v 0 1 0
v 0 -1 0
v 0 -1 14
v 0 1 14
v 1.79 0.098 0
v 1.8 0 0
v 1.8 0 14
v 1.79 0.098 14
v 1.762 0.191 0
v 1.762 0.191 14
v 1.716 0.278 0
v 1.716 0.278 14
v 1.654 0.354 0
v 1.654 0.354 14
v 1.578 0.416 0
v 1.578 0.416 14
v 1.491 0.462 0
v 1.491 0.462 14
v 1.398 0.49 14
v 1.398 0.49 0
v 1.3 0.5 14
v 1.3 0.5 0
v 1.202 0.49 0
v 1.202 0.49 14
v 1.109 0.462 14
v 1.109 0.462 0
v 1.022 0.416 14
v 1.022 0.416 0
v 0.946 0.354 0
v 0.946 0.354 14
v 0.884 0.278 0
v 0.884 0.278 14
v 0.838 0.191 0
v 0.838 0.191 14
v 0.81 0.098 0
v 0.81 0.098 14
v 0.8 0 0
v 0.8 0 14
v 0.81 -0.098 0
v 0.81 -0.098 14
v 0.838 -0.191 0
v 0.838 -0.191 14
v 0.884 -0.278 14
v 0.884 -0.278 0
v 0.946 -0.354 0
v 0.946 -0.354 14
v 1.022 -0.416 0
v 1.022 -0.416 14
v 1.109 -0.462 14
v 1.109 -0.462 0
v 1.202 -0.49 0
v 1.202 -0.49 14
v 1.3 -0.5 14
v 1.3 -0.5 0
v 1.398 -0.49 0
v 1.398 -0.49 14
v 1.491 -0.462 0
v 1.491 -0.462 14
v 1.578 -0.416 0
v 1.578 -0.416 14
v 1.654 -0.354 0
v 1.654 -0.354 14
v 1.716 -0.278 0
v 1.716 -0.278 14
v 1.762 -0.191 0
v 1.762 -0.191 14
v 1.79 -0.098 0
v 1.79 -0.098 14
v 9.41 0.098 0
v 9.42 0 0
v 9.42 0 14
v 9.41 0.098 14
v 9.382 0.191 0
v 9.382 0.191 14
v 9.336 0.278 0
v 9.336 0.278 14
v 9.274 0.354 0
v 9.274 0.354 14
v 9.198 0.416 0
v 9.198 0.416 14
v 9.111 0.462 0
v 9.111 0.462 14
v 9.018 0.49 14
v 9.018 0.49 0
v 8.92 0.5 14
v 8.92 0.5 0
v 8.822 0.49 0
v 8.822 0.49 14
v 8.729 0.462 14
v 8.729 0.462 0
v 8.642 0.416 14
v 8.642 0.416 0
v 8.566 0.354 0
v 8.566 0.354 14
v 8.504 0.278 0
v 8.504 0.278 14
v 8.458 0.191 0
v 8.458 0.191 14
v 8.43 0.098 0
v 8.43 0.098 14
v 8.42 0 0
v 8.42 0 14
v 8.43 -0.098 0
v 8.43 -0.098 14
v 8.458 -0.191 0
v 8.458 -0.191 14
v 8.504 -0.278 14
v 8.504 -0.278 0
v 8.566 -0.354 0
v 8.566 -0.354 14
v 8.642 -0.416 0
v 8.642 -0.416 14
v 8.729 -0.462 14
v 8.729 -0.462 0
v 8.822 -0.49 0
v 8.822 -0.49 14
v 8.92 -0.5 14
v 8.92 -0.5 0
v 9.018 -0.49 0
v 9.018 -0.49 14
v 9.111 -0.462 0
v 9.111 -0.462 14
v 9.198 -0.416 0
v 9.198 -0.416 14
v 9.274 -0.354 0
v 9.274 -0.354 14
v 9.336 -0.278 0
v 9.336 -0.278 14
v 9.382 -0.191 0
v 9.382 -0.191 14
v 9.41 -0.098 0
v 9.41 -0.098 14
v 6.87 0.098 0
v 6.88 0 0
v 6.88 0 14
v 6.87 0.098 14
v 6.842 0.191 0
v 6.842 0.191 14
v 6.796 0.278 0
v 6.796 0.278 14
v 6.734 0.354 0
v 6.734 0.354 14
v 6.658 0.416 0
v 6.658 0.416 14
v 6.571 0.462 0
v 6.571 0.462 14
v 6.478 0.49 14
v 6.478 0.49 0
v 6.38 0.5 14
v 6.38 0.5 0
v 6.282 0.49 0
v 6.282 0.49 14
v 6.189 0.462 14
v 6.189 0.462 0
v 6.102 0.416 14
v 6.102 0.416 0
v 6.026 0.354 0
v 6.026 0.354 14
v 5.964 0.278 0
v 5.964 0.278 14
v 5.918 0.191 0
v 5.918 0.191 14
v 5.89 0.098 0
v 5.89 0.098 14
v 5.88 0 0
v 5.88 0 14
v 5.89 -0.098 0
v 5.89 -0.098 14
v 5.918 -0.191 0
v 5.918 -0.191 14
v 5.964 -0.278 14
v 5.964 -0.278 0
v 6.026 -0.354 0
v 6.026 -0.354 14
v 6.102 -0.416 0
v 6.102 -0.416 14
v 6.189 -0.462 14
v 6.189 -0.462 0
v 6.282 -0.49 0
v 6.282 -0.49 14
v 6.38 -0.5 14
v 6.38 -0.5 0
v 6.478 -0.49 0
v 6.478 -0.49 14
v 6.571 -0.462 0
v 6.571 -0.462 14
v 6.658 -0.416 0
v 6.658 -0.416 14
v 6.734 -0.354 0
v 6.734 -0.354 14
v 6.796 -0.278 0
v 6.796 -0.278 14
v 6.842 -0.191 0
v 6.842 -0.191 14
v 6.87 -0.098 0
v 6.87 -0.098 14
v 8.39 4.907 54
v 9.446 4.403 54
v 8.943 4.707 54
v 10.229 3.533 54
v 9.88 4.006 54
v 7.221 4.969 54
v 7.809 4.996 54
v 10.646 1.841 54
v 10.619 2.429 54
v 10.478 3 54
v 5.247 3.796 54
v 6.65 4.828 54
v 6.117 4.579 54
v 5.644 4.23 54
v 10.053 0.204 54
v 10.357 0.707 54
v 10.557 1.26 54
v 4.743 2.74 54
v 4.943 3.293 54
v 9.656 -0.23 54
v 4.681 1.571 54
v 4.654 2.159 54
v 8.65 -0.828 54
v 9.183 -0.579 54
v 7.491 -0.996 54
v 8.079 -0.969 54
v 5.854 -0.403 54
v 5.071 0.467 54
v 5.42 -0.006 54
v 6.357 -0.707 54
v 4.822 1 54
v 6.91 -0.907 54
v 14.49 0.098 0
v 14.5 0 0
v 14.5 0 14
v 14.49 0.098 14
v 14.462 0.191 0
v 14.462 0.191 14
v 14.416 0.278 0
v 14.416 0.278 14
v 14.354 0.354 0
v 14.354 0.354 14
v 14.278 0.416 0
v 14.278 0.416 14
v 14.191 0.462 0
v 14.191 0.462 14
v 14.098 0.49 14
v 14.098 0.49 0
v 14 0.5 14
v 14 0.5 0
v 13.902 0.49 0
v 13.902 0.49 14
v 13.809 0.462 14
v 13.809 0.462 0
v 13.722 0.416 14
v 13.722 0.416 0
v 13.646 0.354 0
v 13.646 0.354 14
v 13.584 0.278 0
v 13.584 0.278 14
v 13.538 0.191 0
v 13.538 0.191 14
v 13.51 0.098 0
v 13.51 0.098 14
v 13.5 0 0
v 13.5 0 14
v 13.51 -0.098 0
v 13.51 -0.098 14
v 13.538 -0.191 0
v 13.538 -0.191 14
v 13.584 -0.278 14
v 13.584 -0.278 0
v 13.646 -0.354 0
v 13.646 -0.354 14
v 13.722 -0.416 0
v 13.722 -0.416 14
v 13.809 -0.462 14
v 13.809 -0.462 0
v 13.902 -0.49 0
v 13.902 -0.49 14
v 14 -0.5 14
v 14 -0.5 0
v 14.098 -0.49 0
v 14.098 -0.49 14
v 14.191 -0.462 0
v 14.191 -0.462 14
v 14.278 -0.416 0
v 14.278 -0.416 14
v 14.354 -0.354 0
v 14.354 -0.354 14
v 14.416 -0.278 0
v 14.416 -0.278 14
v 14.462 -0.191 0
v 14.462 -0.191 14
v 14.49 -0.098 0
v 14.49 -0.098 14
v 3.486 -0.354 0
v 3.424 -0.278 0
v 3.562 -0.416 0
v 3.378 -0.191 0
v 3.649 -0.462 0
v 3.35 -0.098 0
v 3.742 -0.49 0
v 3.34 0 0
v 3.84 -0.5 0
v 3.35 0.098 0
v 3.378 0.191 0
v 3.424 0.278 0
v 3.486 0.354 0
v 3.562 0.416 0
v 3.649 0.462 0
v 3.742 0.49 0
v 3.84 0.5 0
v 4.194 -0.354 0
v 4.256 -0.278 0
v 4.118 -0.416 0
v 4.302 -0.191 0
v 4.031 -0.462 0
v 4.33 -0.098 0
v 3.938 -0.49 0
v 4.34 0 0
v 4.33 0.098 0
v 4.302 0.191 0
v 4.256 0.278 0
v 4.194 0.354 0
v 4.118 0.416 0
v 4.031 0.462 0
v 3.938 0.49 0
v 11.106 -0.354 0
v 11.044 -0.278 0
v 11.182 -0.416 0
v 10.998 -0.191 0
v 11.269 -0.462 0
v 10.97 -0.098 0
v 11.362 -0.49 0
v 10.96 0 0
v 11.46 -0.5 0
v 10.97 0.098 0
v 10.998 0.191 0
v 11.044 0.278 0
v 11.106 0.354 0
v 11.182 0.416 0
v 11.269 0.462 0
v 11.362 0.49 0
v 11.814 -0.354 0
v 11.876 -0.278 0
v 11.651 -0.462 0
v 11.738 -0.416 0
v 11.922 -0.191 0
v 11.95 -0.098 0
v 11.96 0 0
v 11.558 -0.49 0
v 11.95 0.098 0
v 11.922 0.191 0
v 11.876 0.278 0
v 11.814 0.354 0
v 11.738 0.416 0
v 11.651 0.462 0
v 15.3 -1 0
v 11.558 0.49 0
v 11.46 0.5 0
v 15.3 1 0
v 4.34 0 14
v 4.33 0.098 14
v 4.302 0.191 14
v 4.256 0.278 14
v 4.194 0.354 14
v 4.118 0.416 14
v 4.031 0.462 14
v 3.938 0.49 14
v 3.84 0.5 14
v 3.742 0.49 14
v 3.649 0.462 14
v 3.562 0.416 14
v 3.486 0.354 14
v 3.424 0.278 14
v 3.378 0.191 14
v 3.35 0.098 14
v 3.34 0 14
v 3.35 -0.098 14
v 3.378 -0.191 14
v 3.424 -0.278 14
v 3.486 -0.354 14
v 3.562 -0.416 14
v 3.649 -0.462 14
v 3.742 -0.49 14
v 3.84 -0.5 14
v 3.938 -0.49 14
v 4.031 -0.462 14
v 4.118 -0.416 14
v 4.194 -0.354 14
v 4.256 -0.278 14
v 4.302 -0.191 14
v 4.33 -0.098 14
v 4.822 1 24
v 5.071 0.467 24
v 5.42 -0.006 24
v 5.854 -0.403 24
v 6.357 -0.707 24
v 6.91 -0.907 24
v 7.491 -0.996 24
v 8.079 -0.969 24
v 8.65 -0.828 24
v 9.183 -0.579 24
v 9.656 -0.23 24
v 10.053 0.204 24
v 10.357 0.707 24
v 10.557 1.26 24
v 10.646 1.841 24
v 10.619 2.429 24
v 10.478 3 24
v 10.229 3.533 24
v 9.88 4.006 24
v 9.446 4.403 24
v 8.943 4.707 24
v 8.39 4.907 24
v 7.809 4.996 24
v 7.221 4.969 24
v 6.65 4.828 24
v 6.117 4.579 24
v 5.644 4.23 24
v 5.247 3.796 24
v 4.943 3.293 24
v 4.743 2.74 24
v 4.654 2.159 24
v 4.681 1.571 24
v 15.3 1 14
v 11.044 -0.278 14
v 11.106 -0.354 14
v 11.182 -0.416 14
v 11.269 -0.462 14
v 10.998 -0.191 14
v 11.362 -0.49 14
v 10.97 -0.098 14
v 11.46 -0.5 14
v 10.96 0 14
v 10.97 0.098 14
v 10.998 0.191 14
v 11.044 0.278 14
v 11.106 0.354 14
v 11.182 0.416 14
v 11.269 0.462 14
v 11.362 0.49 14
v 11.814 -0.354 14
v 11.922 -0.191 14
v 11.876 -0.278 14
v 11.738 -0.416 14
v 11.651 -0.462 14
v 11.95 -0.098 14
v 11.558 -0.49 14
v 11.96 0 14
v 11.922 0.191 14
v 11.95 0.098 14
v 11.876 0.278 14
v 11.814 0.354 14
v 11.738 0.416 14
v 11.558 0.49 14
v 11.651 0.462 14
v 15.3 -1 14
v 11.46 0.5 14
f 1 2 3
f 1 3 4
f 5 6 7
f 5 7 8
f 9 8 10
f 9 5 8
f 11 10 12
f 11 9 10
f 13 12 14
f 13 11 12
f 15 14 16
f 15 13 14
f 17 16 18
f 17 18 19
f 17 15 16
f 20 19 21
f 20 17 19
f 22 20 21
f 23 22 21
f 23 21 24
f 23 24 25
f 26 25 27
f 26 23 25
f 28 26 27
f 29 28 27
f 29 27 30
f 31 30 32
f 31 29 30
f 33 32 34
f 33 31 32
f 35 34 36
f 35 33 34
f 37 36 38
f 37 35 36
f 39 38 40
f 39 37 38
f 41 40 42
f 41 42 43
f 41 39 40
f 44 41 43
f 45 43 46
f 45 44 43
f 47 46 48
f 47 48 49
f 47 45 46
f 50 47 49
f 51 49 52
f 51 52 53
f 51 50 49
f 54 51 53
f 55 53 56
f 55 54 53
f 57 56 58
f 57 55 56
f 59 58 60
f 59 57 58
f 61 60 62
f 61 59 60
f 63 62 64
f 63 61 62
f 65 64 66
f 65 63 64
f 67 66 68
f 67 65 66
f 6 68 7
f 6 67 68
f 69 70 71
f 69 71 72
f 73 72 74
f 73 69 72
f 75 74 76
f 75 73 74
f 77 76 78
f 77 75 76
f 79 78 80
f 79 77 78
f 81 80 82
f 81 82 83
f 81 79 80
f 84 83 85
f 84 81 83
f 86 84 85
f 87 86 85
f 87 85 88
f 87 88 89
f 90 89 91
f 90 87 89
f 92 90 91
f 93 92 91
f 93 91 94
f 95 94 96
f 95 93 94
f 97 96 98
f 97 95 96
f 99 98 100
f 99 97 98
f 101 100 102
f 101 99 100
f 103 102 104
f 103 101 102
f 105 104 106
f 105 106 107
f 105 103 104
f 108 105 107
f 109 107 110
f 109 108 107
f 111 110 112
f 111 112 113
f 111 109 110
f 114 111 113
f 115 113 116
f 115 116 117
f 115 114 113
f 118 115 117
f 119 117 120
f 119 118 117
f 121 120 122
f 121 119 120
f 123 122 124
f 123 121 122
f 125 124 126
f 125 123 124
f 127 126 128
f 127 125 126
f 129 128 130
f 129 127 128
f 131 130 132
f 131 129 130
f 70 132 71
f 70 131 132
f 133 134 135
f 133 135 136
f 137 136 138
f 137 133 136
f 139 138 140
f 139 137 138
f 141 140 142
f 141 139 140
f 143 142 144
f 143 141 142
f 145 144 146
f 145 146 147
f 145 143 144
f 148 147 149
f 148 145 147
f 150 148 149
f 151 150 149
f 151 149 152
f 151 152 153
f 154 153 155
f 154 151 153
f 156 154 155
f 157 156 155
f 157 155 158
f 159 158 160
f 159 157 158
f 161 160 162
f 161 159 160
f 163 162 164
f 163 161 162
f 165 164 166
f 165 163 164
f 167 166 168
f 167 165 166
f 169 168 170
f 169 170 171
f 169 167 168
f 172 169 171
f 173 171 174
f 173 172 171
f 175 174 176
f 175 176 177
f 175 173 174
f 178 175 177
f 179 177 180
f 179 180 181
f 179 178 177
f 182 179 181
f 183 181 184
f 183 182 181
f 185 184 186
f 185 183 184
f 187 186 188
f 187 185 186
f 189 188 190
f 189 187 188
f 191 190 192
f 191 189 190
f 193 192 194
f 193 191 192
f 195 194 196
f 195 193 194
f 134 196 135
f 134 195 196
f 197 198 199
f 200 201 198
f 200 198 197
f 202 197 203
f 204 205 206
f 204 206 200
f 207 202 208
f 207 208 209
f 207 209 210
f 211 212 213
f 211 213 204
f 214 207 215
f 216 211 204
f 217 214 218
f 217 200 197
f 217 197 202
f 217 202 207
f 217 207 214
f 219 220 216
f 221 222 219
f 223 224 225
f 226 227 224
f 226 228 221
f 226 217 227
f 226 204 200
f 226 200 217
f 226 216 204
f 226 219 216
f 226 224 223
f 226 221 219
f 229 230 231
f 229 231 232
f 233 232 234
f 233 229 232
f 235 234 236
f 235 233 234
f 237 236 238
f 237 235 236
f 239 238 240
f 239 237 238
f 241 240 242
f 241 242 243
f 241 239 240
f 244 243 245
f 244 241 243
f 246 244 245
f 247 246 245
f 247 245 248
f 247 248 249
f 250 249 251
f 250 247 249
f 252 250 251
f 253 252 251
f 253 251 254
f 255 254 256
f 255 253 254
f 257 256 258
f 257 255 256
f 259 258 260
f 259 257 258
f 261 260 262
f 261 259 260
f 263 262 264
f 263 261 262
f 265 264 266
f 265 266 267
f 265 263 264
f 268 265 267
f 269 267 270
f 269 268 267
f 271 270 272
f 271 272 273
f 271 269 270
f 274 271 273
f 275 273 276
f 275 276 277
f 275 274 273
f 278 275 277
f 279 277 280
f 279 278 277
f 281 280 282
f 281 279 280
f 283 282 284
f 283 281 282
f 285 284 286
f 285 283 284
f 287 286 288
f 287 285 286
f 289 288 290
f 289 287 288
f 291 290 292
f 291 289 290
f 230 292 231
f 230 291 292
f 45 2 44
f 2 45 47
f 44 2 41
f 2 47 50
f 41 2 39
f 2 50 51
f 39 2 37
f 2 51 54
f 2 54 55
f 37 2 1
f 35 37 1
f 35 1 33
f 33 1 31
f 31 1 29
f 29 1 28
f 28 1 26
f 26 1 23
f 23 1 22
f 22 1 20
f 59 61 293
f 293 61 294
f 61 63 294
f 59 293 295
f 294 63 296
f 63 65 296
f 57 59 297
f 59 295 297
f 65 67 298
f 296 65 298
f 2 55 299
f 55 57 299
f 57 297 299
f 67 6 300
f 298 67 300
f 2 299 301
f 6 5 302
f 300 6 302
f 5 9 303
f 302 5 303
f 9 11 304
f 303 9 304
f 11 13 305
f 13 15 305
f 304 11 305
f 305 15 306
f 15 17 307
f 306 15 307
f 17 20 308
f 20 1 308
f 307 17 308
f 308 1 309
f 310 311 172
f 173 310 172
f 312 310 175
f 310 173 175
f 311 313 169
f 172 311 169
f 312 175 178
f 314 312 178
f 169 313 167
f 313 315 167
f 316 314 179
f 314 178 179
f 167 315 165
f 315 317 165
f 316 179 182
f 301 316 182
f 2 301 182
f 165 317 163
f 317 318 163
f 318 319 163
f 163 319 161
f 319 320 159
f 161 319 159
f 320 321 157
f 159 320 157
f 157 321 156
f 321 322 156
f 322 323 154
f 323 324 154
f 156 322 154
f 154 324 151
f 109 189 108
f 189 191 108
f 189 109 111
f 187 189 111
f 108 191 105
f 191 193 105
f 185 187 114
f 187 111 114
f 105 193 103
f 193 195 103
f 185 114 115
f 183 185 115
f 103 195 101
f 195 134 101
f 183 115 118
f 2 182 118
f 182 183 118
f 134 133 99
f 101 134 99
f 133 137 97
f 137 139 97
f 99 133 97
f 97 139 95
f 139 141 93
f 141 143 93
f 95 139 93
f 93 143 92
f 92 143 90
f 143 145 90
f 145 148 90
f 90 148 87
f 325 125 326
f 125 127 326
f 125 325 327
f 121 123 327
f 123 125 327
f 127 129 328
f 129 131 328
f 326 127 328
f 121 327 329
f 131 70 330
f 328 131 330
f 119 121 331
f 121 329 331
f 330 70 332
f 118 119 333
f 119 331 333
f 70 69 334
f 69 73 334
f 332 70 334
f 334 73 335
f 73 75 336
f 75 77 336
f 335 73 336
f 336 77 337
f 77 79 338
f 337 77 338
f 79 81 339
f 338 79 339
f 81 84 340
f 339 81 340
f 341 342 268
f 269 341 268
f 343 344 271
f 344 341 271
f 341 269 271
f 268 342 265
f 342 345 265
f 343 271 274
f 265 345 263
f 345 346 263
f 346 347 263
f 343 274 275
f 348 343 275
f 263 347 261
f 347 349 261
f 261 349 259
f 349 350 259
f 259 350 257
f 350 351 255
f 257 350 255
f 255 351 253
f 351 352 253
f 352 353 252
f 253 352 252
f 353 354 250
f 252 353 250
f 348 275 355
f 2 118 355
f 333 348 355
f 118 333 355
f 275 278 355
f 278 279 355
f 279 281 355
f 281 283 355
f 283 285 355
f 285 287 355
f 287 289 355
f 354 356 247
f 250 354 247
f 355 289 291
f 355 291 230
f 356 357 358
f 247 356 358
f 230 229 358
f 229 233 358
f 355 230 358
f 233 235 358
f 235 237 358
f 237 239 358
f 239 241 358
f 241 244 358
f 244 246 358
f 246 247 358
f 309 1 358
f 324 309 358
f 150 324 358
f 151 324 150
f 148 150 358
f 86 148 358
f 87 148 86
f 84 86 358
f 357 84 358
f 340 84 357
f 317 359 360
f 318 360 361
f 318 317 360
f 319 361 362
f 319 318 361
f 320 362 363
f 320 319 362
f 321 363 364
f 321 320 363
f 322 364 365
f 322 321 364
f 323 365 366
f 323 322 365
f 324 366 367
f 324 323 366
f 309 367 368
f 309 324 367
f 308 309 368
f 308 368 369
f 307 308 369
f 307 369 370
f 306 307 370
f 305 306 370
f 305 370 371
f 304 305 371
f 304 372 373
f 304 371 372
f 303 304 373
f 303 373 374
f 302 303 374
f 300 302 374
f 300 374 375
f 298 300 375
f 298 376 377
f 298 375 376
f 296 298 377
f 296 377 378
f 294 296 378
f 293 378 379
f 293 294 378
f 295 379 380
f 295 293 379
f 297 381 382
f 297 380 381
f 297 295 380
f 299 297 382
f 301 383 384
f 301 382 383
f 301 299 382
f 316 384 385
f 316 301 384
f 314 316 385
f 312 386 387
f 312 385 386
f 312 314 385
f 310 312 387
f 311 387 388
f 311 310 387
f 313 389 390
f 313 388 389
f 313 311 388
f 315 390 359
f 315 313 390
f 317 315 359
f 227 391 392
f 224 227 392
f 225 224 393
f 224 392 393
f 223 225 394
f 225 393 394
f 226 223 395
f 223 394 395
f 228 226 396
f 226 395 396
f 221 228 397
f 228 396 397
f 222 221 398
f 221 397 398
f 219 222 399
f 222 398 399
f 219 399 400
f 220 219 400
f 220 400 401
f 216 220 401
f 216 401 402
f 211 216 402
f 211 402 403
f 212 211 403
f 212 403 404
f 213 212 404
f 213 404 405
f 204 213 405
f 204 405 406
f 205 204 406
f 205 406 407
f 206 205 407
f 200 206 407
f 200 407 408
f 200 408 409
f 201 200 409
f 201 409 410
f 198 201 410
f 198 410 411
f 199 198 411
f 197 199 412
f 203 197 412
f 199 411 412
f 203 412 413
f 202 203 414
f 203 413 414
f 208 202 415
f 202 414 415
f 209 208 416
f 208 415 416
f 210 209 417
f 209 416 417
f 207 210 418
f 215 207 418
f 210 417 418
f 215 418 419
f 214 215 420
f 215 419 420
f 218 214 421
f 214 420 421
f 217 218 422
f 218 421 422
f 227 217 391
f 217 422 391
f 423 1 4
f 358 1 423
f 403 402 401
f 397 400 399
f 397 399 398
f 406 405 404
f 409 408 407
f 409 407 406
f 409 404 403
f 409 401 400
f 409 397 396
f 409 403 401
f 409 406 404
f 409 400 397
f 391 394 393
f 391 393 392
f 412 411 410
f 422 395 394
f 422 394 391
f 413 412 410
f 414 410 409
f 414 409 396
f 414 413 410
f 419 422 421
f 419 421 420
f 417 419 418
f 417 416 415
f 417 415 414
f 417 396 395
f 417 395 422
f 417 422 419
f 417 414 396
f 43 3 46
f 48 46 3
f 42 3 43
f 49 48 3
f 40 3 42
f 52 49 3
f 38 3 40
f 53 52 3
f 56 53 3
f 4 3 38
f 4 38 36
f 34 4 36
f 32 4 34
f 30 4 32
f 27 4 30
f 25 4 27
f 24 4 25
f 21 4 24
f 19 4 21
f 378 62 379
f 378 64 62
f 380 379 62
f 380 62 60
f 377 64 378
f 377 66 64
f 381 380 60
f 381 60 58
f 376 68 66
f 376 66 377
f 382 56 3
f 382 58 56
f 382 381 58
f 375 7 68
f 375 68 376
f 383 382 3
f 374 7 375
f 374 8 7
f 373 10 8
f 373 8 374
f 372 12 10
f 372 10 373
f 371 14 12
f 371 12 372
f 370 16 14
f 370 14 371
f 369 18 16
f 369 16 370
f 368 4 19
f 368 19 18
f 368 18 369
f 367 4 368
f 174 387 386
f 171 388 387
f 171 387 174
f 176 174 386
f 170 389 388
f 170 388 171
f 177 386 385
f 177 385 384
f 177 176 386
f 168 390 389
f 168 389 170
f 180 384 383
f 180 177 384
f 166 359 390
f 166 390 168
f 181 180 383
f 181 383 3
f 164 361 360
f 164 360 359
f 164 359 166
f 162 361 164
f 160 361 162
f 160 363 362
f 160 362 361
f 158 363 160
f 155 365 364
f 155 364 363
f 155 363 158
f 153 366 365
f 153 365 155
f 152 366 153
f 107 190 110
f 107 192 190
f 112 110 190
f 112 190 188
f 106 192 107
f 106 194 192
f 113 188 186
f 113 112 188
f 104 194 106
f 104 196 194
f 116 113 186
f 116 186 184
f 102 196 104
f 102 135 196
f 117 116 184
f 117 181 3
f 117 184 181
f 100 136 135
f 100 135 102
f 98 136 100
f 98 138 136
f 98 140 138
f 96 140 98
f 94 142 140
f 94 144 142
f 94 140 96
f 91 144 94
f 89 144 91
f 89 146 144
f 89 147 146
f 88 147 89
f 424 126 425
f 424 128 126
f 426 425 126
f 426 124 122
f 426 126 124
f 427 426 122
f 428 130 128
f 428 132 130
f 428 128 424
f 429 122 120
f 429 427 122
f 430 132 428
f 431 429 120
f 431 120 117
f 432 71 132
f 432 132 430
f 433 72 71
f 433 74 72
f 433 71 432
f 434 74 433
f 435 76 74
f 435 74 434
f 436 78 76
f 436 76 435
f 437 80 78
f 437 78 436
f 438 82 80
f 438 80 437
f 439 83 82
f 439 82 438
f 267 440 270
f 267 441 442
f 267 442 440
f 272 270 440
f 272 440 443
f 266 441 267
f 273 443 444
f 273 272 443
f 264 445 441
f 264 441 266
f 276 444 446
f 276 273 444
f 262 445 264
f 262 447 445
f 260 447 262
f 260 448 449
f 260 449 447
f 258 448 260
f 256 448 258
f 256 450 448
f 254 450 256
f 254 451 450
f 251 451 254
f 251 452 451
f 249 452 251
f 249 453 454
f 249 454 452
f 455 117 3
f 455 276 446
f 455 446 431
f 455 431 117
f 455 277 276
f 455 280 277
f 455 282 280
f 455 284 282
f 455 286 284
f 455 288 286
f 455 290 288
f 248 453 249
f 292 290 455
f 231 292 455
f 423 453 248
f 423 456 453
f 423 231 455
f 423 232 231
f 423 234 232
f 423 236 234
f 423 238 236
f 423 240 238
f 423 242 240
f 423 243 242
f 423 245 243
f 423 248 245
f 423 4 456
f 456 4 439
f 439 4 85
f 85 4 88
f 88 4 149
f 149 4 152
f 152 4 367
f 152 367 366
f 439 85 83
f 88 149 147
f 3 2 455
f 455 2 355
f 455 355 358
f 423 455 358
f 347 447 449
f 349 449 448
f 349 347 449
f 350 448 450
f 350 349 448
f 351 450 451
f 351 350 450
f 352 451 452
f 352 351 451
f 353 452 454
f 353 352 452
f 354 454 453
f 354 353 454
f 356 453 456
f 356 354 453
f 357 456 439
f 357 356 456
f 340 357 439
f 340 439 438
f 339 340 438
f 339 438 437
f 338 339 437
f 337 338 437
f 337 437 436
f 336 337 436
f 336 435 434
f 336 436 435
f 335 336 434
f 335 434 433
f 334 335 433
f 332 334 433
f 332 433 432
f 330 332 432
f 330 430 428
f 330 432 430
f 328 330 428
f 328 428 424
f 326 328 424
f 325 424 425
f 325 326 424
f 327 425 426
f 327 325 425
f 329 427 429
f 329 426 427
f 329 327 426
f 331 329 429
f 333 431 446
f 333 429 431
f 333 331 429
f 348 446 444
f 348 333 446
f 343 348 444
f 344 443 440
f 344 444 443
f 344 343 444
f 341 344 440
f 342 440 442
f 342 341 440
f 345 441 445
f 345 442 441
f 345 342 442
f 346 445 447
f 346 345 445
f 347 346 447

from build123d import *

# Parameters (mm, degrees)
ESQUISSE1_W             = 15.3
ESQUISSE1_H             = 2
ESQUISSE1_R             = 0.5
BOSS_EXTRU_1_DEPTH      = 14
ESQUISSE2_R             = 3
BOSS_EXTRU_2_DEPTH      = 40
ESQUISSE3_R             = 4
ENL_V_MAT_EXTRU_1_DEPTH = 10


with BuildPart() as part:
    # Esquisse1 → Boss.-Extru.1 (new body)
    with BuildSketch(Plane.XY):
        with Locations((7.65, 0)):
            Rectangle(ESQUISSE1_W, ESQUISSE1_H)
        with Locations((1.3, 0)):
            Circle(ESQUISSE1_R, mode=Mode.SUBTRACT)
        with Locations((3.84, 0)):
            Circle(ESQUISSE1_R, mode=Mode.SUBTRACT)
        with Locations((6.38, 0)):
            Circle(ESQUISSE1_R, mode=Mode.SUBTRACT)
        with Locations((8.92, 0)):
            Circle(ESQUISSE1_R, mode=Mode.SUBTRACT)
        with Locations((11.46, 0)):
            Circle(ESQUISSE1_R, mode=Mode.SUBTRACT)
        with Locations((14, 0)):
            Circle(ESQUISSE1_R, mode=Mode.SUBTRACT)
    extrude(amount=BOSS_EXTRU_1_DEPTH)

    # Esquisse2 → Boss.-Extru.2 (add)
    with BuildSketch(Plane.XY.offset(14)):
        with Locations(Location((7.65, 2, 0), (0, 0, 199.471220634))):
            Circle(ESQUISSE2_R)
    extrude(amount=BOSS_EXTRU_2_DEPTH)

    # Esquisse3 → Enlèv. mat.-Extru.1 (cut)
    with BuildSketch(Plane(origin=(0, 0, 14), x_dir=(-1, 0, 0), z_dir=(0, 0, -1))):
        with Locations((-7.65, 2)):
            Circle(ESQUISSE3_R)
    extrude(amount=-ENL_V_MAT_EXTRU_1_DEPTH, mode=Mode.SUBTRACT)


with BuildPart() as enl_v_mat_extru_1_piece_1:
    # of the separate pieces the step leaves, piece 1, a body of its own (enl_v_mat_extru_1_pieces)
    add(part.part.solids().sort_by_distance((4.821572875, 1, 24))[0])


with BuildPart() as enl_v_mat_extru_1_piece_2:
    # of the separate pieces the step leaves, piece 2, a body of its own (enl_v_mat_extru_1_pieces)
    add(part.part.solids().sort_by_distance((0, 1, 0))[0])


solid = Compound([enl_v_mat_extru_1_piece_1.part, enl_v_mat_extru_1_piece_2.part])
